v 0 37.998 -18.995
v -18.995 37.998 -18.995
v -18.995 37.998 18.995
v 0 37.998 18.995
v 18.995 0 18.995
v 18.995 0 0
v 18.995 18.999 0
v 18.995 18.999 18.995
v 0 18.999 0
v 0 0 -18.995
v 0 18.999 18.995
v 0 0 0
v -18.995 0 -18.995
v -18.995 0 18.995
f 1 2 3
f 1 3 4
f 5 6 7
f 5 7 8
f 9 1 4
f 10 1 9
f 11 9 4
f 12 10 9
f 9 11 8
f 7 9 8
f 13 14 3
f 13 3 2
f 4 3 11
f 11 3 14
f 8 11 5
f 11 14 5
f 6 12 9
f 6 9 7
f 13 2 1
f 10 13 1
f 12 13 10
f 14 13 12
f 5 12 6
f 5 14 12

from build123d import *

# Parameters (mm, degrees)
F0_W     = 18.995181
F0_H     = 18.995181
F1_DEPTH = 37.9984
F0_W_2   = 18.995179
F2_DEPTH = 18.9992


with BuildPart() as f1:
    # F0 (on Front) → F1 (new body)
    with BuildSketch(Plane.XZ):
        with Locations((-9.49759, 9.49759)):
            Rectangle(F0_W, F0_H)
        with Locations((-9.49759, -9.49759)):
            Rectangle(F0_W, F0_H)
    extrude(amount=-F1_DEPTH)

    # F0 (on Front) → F2 (join)
    with BuildSketch(Plane.XZ):
        with Locations((9.49759, 9.49759)):
            Rectangle(F0_W_2, F0_H)
    extrude(amount=-F2_DEPTH)


solid = f1.part
